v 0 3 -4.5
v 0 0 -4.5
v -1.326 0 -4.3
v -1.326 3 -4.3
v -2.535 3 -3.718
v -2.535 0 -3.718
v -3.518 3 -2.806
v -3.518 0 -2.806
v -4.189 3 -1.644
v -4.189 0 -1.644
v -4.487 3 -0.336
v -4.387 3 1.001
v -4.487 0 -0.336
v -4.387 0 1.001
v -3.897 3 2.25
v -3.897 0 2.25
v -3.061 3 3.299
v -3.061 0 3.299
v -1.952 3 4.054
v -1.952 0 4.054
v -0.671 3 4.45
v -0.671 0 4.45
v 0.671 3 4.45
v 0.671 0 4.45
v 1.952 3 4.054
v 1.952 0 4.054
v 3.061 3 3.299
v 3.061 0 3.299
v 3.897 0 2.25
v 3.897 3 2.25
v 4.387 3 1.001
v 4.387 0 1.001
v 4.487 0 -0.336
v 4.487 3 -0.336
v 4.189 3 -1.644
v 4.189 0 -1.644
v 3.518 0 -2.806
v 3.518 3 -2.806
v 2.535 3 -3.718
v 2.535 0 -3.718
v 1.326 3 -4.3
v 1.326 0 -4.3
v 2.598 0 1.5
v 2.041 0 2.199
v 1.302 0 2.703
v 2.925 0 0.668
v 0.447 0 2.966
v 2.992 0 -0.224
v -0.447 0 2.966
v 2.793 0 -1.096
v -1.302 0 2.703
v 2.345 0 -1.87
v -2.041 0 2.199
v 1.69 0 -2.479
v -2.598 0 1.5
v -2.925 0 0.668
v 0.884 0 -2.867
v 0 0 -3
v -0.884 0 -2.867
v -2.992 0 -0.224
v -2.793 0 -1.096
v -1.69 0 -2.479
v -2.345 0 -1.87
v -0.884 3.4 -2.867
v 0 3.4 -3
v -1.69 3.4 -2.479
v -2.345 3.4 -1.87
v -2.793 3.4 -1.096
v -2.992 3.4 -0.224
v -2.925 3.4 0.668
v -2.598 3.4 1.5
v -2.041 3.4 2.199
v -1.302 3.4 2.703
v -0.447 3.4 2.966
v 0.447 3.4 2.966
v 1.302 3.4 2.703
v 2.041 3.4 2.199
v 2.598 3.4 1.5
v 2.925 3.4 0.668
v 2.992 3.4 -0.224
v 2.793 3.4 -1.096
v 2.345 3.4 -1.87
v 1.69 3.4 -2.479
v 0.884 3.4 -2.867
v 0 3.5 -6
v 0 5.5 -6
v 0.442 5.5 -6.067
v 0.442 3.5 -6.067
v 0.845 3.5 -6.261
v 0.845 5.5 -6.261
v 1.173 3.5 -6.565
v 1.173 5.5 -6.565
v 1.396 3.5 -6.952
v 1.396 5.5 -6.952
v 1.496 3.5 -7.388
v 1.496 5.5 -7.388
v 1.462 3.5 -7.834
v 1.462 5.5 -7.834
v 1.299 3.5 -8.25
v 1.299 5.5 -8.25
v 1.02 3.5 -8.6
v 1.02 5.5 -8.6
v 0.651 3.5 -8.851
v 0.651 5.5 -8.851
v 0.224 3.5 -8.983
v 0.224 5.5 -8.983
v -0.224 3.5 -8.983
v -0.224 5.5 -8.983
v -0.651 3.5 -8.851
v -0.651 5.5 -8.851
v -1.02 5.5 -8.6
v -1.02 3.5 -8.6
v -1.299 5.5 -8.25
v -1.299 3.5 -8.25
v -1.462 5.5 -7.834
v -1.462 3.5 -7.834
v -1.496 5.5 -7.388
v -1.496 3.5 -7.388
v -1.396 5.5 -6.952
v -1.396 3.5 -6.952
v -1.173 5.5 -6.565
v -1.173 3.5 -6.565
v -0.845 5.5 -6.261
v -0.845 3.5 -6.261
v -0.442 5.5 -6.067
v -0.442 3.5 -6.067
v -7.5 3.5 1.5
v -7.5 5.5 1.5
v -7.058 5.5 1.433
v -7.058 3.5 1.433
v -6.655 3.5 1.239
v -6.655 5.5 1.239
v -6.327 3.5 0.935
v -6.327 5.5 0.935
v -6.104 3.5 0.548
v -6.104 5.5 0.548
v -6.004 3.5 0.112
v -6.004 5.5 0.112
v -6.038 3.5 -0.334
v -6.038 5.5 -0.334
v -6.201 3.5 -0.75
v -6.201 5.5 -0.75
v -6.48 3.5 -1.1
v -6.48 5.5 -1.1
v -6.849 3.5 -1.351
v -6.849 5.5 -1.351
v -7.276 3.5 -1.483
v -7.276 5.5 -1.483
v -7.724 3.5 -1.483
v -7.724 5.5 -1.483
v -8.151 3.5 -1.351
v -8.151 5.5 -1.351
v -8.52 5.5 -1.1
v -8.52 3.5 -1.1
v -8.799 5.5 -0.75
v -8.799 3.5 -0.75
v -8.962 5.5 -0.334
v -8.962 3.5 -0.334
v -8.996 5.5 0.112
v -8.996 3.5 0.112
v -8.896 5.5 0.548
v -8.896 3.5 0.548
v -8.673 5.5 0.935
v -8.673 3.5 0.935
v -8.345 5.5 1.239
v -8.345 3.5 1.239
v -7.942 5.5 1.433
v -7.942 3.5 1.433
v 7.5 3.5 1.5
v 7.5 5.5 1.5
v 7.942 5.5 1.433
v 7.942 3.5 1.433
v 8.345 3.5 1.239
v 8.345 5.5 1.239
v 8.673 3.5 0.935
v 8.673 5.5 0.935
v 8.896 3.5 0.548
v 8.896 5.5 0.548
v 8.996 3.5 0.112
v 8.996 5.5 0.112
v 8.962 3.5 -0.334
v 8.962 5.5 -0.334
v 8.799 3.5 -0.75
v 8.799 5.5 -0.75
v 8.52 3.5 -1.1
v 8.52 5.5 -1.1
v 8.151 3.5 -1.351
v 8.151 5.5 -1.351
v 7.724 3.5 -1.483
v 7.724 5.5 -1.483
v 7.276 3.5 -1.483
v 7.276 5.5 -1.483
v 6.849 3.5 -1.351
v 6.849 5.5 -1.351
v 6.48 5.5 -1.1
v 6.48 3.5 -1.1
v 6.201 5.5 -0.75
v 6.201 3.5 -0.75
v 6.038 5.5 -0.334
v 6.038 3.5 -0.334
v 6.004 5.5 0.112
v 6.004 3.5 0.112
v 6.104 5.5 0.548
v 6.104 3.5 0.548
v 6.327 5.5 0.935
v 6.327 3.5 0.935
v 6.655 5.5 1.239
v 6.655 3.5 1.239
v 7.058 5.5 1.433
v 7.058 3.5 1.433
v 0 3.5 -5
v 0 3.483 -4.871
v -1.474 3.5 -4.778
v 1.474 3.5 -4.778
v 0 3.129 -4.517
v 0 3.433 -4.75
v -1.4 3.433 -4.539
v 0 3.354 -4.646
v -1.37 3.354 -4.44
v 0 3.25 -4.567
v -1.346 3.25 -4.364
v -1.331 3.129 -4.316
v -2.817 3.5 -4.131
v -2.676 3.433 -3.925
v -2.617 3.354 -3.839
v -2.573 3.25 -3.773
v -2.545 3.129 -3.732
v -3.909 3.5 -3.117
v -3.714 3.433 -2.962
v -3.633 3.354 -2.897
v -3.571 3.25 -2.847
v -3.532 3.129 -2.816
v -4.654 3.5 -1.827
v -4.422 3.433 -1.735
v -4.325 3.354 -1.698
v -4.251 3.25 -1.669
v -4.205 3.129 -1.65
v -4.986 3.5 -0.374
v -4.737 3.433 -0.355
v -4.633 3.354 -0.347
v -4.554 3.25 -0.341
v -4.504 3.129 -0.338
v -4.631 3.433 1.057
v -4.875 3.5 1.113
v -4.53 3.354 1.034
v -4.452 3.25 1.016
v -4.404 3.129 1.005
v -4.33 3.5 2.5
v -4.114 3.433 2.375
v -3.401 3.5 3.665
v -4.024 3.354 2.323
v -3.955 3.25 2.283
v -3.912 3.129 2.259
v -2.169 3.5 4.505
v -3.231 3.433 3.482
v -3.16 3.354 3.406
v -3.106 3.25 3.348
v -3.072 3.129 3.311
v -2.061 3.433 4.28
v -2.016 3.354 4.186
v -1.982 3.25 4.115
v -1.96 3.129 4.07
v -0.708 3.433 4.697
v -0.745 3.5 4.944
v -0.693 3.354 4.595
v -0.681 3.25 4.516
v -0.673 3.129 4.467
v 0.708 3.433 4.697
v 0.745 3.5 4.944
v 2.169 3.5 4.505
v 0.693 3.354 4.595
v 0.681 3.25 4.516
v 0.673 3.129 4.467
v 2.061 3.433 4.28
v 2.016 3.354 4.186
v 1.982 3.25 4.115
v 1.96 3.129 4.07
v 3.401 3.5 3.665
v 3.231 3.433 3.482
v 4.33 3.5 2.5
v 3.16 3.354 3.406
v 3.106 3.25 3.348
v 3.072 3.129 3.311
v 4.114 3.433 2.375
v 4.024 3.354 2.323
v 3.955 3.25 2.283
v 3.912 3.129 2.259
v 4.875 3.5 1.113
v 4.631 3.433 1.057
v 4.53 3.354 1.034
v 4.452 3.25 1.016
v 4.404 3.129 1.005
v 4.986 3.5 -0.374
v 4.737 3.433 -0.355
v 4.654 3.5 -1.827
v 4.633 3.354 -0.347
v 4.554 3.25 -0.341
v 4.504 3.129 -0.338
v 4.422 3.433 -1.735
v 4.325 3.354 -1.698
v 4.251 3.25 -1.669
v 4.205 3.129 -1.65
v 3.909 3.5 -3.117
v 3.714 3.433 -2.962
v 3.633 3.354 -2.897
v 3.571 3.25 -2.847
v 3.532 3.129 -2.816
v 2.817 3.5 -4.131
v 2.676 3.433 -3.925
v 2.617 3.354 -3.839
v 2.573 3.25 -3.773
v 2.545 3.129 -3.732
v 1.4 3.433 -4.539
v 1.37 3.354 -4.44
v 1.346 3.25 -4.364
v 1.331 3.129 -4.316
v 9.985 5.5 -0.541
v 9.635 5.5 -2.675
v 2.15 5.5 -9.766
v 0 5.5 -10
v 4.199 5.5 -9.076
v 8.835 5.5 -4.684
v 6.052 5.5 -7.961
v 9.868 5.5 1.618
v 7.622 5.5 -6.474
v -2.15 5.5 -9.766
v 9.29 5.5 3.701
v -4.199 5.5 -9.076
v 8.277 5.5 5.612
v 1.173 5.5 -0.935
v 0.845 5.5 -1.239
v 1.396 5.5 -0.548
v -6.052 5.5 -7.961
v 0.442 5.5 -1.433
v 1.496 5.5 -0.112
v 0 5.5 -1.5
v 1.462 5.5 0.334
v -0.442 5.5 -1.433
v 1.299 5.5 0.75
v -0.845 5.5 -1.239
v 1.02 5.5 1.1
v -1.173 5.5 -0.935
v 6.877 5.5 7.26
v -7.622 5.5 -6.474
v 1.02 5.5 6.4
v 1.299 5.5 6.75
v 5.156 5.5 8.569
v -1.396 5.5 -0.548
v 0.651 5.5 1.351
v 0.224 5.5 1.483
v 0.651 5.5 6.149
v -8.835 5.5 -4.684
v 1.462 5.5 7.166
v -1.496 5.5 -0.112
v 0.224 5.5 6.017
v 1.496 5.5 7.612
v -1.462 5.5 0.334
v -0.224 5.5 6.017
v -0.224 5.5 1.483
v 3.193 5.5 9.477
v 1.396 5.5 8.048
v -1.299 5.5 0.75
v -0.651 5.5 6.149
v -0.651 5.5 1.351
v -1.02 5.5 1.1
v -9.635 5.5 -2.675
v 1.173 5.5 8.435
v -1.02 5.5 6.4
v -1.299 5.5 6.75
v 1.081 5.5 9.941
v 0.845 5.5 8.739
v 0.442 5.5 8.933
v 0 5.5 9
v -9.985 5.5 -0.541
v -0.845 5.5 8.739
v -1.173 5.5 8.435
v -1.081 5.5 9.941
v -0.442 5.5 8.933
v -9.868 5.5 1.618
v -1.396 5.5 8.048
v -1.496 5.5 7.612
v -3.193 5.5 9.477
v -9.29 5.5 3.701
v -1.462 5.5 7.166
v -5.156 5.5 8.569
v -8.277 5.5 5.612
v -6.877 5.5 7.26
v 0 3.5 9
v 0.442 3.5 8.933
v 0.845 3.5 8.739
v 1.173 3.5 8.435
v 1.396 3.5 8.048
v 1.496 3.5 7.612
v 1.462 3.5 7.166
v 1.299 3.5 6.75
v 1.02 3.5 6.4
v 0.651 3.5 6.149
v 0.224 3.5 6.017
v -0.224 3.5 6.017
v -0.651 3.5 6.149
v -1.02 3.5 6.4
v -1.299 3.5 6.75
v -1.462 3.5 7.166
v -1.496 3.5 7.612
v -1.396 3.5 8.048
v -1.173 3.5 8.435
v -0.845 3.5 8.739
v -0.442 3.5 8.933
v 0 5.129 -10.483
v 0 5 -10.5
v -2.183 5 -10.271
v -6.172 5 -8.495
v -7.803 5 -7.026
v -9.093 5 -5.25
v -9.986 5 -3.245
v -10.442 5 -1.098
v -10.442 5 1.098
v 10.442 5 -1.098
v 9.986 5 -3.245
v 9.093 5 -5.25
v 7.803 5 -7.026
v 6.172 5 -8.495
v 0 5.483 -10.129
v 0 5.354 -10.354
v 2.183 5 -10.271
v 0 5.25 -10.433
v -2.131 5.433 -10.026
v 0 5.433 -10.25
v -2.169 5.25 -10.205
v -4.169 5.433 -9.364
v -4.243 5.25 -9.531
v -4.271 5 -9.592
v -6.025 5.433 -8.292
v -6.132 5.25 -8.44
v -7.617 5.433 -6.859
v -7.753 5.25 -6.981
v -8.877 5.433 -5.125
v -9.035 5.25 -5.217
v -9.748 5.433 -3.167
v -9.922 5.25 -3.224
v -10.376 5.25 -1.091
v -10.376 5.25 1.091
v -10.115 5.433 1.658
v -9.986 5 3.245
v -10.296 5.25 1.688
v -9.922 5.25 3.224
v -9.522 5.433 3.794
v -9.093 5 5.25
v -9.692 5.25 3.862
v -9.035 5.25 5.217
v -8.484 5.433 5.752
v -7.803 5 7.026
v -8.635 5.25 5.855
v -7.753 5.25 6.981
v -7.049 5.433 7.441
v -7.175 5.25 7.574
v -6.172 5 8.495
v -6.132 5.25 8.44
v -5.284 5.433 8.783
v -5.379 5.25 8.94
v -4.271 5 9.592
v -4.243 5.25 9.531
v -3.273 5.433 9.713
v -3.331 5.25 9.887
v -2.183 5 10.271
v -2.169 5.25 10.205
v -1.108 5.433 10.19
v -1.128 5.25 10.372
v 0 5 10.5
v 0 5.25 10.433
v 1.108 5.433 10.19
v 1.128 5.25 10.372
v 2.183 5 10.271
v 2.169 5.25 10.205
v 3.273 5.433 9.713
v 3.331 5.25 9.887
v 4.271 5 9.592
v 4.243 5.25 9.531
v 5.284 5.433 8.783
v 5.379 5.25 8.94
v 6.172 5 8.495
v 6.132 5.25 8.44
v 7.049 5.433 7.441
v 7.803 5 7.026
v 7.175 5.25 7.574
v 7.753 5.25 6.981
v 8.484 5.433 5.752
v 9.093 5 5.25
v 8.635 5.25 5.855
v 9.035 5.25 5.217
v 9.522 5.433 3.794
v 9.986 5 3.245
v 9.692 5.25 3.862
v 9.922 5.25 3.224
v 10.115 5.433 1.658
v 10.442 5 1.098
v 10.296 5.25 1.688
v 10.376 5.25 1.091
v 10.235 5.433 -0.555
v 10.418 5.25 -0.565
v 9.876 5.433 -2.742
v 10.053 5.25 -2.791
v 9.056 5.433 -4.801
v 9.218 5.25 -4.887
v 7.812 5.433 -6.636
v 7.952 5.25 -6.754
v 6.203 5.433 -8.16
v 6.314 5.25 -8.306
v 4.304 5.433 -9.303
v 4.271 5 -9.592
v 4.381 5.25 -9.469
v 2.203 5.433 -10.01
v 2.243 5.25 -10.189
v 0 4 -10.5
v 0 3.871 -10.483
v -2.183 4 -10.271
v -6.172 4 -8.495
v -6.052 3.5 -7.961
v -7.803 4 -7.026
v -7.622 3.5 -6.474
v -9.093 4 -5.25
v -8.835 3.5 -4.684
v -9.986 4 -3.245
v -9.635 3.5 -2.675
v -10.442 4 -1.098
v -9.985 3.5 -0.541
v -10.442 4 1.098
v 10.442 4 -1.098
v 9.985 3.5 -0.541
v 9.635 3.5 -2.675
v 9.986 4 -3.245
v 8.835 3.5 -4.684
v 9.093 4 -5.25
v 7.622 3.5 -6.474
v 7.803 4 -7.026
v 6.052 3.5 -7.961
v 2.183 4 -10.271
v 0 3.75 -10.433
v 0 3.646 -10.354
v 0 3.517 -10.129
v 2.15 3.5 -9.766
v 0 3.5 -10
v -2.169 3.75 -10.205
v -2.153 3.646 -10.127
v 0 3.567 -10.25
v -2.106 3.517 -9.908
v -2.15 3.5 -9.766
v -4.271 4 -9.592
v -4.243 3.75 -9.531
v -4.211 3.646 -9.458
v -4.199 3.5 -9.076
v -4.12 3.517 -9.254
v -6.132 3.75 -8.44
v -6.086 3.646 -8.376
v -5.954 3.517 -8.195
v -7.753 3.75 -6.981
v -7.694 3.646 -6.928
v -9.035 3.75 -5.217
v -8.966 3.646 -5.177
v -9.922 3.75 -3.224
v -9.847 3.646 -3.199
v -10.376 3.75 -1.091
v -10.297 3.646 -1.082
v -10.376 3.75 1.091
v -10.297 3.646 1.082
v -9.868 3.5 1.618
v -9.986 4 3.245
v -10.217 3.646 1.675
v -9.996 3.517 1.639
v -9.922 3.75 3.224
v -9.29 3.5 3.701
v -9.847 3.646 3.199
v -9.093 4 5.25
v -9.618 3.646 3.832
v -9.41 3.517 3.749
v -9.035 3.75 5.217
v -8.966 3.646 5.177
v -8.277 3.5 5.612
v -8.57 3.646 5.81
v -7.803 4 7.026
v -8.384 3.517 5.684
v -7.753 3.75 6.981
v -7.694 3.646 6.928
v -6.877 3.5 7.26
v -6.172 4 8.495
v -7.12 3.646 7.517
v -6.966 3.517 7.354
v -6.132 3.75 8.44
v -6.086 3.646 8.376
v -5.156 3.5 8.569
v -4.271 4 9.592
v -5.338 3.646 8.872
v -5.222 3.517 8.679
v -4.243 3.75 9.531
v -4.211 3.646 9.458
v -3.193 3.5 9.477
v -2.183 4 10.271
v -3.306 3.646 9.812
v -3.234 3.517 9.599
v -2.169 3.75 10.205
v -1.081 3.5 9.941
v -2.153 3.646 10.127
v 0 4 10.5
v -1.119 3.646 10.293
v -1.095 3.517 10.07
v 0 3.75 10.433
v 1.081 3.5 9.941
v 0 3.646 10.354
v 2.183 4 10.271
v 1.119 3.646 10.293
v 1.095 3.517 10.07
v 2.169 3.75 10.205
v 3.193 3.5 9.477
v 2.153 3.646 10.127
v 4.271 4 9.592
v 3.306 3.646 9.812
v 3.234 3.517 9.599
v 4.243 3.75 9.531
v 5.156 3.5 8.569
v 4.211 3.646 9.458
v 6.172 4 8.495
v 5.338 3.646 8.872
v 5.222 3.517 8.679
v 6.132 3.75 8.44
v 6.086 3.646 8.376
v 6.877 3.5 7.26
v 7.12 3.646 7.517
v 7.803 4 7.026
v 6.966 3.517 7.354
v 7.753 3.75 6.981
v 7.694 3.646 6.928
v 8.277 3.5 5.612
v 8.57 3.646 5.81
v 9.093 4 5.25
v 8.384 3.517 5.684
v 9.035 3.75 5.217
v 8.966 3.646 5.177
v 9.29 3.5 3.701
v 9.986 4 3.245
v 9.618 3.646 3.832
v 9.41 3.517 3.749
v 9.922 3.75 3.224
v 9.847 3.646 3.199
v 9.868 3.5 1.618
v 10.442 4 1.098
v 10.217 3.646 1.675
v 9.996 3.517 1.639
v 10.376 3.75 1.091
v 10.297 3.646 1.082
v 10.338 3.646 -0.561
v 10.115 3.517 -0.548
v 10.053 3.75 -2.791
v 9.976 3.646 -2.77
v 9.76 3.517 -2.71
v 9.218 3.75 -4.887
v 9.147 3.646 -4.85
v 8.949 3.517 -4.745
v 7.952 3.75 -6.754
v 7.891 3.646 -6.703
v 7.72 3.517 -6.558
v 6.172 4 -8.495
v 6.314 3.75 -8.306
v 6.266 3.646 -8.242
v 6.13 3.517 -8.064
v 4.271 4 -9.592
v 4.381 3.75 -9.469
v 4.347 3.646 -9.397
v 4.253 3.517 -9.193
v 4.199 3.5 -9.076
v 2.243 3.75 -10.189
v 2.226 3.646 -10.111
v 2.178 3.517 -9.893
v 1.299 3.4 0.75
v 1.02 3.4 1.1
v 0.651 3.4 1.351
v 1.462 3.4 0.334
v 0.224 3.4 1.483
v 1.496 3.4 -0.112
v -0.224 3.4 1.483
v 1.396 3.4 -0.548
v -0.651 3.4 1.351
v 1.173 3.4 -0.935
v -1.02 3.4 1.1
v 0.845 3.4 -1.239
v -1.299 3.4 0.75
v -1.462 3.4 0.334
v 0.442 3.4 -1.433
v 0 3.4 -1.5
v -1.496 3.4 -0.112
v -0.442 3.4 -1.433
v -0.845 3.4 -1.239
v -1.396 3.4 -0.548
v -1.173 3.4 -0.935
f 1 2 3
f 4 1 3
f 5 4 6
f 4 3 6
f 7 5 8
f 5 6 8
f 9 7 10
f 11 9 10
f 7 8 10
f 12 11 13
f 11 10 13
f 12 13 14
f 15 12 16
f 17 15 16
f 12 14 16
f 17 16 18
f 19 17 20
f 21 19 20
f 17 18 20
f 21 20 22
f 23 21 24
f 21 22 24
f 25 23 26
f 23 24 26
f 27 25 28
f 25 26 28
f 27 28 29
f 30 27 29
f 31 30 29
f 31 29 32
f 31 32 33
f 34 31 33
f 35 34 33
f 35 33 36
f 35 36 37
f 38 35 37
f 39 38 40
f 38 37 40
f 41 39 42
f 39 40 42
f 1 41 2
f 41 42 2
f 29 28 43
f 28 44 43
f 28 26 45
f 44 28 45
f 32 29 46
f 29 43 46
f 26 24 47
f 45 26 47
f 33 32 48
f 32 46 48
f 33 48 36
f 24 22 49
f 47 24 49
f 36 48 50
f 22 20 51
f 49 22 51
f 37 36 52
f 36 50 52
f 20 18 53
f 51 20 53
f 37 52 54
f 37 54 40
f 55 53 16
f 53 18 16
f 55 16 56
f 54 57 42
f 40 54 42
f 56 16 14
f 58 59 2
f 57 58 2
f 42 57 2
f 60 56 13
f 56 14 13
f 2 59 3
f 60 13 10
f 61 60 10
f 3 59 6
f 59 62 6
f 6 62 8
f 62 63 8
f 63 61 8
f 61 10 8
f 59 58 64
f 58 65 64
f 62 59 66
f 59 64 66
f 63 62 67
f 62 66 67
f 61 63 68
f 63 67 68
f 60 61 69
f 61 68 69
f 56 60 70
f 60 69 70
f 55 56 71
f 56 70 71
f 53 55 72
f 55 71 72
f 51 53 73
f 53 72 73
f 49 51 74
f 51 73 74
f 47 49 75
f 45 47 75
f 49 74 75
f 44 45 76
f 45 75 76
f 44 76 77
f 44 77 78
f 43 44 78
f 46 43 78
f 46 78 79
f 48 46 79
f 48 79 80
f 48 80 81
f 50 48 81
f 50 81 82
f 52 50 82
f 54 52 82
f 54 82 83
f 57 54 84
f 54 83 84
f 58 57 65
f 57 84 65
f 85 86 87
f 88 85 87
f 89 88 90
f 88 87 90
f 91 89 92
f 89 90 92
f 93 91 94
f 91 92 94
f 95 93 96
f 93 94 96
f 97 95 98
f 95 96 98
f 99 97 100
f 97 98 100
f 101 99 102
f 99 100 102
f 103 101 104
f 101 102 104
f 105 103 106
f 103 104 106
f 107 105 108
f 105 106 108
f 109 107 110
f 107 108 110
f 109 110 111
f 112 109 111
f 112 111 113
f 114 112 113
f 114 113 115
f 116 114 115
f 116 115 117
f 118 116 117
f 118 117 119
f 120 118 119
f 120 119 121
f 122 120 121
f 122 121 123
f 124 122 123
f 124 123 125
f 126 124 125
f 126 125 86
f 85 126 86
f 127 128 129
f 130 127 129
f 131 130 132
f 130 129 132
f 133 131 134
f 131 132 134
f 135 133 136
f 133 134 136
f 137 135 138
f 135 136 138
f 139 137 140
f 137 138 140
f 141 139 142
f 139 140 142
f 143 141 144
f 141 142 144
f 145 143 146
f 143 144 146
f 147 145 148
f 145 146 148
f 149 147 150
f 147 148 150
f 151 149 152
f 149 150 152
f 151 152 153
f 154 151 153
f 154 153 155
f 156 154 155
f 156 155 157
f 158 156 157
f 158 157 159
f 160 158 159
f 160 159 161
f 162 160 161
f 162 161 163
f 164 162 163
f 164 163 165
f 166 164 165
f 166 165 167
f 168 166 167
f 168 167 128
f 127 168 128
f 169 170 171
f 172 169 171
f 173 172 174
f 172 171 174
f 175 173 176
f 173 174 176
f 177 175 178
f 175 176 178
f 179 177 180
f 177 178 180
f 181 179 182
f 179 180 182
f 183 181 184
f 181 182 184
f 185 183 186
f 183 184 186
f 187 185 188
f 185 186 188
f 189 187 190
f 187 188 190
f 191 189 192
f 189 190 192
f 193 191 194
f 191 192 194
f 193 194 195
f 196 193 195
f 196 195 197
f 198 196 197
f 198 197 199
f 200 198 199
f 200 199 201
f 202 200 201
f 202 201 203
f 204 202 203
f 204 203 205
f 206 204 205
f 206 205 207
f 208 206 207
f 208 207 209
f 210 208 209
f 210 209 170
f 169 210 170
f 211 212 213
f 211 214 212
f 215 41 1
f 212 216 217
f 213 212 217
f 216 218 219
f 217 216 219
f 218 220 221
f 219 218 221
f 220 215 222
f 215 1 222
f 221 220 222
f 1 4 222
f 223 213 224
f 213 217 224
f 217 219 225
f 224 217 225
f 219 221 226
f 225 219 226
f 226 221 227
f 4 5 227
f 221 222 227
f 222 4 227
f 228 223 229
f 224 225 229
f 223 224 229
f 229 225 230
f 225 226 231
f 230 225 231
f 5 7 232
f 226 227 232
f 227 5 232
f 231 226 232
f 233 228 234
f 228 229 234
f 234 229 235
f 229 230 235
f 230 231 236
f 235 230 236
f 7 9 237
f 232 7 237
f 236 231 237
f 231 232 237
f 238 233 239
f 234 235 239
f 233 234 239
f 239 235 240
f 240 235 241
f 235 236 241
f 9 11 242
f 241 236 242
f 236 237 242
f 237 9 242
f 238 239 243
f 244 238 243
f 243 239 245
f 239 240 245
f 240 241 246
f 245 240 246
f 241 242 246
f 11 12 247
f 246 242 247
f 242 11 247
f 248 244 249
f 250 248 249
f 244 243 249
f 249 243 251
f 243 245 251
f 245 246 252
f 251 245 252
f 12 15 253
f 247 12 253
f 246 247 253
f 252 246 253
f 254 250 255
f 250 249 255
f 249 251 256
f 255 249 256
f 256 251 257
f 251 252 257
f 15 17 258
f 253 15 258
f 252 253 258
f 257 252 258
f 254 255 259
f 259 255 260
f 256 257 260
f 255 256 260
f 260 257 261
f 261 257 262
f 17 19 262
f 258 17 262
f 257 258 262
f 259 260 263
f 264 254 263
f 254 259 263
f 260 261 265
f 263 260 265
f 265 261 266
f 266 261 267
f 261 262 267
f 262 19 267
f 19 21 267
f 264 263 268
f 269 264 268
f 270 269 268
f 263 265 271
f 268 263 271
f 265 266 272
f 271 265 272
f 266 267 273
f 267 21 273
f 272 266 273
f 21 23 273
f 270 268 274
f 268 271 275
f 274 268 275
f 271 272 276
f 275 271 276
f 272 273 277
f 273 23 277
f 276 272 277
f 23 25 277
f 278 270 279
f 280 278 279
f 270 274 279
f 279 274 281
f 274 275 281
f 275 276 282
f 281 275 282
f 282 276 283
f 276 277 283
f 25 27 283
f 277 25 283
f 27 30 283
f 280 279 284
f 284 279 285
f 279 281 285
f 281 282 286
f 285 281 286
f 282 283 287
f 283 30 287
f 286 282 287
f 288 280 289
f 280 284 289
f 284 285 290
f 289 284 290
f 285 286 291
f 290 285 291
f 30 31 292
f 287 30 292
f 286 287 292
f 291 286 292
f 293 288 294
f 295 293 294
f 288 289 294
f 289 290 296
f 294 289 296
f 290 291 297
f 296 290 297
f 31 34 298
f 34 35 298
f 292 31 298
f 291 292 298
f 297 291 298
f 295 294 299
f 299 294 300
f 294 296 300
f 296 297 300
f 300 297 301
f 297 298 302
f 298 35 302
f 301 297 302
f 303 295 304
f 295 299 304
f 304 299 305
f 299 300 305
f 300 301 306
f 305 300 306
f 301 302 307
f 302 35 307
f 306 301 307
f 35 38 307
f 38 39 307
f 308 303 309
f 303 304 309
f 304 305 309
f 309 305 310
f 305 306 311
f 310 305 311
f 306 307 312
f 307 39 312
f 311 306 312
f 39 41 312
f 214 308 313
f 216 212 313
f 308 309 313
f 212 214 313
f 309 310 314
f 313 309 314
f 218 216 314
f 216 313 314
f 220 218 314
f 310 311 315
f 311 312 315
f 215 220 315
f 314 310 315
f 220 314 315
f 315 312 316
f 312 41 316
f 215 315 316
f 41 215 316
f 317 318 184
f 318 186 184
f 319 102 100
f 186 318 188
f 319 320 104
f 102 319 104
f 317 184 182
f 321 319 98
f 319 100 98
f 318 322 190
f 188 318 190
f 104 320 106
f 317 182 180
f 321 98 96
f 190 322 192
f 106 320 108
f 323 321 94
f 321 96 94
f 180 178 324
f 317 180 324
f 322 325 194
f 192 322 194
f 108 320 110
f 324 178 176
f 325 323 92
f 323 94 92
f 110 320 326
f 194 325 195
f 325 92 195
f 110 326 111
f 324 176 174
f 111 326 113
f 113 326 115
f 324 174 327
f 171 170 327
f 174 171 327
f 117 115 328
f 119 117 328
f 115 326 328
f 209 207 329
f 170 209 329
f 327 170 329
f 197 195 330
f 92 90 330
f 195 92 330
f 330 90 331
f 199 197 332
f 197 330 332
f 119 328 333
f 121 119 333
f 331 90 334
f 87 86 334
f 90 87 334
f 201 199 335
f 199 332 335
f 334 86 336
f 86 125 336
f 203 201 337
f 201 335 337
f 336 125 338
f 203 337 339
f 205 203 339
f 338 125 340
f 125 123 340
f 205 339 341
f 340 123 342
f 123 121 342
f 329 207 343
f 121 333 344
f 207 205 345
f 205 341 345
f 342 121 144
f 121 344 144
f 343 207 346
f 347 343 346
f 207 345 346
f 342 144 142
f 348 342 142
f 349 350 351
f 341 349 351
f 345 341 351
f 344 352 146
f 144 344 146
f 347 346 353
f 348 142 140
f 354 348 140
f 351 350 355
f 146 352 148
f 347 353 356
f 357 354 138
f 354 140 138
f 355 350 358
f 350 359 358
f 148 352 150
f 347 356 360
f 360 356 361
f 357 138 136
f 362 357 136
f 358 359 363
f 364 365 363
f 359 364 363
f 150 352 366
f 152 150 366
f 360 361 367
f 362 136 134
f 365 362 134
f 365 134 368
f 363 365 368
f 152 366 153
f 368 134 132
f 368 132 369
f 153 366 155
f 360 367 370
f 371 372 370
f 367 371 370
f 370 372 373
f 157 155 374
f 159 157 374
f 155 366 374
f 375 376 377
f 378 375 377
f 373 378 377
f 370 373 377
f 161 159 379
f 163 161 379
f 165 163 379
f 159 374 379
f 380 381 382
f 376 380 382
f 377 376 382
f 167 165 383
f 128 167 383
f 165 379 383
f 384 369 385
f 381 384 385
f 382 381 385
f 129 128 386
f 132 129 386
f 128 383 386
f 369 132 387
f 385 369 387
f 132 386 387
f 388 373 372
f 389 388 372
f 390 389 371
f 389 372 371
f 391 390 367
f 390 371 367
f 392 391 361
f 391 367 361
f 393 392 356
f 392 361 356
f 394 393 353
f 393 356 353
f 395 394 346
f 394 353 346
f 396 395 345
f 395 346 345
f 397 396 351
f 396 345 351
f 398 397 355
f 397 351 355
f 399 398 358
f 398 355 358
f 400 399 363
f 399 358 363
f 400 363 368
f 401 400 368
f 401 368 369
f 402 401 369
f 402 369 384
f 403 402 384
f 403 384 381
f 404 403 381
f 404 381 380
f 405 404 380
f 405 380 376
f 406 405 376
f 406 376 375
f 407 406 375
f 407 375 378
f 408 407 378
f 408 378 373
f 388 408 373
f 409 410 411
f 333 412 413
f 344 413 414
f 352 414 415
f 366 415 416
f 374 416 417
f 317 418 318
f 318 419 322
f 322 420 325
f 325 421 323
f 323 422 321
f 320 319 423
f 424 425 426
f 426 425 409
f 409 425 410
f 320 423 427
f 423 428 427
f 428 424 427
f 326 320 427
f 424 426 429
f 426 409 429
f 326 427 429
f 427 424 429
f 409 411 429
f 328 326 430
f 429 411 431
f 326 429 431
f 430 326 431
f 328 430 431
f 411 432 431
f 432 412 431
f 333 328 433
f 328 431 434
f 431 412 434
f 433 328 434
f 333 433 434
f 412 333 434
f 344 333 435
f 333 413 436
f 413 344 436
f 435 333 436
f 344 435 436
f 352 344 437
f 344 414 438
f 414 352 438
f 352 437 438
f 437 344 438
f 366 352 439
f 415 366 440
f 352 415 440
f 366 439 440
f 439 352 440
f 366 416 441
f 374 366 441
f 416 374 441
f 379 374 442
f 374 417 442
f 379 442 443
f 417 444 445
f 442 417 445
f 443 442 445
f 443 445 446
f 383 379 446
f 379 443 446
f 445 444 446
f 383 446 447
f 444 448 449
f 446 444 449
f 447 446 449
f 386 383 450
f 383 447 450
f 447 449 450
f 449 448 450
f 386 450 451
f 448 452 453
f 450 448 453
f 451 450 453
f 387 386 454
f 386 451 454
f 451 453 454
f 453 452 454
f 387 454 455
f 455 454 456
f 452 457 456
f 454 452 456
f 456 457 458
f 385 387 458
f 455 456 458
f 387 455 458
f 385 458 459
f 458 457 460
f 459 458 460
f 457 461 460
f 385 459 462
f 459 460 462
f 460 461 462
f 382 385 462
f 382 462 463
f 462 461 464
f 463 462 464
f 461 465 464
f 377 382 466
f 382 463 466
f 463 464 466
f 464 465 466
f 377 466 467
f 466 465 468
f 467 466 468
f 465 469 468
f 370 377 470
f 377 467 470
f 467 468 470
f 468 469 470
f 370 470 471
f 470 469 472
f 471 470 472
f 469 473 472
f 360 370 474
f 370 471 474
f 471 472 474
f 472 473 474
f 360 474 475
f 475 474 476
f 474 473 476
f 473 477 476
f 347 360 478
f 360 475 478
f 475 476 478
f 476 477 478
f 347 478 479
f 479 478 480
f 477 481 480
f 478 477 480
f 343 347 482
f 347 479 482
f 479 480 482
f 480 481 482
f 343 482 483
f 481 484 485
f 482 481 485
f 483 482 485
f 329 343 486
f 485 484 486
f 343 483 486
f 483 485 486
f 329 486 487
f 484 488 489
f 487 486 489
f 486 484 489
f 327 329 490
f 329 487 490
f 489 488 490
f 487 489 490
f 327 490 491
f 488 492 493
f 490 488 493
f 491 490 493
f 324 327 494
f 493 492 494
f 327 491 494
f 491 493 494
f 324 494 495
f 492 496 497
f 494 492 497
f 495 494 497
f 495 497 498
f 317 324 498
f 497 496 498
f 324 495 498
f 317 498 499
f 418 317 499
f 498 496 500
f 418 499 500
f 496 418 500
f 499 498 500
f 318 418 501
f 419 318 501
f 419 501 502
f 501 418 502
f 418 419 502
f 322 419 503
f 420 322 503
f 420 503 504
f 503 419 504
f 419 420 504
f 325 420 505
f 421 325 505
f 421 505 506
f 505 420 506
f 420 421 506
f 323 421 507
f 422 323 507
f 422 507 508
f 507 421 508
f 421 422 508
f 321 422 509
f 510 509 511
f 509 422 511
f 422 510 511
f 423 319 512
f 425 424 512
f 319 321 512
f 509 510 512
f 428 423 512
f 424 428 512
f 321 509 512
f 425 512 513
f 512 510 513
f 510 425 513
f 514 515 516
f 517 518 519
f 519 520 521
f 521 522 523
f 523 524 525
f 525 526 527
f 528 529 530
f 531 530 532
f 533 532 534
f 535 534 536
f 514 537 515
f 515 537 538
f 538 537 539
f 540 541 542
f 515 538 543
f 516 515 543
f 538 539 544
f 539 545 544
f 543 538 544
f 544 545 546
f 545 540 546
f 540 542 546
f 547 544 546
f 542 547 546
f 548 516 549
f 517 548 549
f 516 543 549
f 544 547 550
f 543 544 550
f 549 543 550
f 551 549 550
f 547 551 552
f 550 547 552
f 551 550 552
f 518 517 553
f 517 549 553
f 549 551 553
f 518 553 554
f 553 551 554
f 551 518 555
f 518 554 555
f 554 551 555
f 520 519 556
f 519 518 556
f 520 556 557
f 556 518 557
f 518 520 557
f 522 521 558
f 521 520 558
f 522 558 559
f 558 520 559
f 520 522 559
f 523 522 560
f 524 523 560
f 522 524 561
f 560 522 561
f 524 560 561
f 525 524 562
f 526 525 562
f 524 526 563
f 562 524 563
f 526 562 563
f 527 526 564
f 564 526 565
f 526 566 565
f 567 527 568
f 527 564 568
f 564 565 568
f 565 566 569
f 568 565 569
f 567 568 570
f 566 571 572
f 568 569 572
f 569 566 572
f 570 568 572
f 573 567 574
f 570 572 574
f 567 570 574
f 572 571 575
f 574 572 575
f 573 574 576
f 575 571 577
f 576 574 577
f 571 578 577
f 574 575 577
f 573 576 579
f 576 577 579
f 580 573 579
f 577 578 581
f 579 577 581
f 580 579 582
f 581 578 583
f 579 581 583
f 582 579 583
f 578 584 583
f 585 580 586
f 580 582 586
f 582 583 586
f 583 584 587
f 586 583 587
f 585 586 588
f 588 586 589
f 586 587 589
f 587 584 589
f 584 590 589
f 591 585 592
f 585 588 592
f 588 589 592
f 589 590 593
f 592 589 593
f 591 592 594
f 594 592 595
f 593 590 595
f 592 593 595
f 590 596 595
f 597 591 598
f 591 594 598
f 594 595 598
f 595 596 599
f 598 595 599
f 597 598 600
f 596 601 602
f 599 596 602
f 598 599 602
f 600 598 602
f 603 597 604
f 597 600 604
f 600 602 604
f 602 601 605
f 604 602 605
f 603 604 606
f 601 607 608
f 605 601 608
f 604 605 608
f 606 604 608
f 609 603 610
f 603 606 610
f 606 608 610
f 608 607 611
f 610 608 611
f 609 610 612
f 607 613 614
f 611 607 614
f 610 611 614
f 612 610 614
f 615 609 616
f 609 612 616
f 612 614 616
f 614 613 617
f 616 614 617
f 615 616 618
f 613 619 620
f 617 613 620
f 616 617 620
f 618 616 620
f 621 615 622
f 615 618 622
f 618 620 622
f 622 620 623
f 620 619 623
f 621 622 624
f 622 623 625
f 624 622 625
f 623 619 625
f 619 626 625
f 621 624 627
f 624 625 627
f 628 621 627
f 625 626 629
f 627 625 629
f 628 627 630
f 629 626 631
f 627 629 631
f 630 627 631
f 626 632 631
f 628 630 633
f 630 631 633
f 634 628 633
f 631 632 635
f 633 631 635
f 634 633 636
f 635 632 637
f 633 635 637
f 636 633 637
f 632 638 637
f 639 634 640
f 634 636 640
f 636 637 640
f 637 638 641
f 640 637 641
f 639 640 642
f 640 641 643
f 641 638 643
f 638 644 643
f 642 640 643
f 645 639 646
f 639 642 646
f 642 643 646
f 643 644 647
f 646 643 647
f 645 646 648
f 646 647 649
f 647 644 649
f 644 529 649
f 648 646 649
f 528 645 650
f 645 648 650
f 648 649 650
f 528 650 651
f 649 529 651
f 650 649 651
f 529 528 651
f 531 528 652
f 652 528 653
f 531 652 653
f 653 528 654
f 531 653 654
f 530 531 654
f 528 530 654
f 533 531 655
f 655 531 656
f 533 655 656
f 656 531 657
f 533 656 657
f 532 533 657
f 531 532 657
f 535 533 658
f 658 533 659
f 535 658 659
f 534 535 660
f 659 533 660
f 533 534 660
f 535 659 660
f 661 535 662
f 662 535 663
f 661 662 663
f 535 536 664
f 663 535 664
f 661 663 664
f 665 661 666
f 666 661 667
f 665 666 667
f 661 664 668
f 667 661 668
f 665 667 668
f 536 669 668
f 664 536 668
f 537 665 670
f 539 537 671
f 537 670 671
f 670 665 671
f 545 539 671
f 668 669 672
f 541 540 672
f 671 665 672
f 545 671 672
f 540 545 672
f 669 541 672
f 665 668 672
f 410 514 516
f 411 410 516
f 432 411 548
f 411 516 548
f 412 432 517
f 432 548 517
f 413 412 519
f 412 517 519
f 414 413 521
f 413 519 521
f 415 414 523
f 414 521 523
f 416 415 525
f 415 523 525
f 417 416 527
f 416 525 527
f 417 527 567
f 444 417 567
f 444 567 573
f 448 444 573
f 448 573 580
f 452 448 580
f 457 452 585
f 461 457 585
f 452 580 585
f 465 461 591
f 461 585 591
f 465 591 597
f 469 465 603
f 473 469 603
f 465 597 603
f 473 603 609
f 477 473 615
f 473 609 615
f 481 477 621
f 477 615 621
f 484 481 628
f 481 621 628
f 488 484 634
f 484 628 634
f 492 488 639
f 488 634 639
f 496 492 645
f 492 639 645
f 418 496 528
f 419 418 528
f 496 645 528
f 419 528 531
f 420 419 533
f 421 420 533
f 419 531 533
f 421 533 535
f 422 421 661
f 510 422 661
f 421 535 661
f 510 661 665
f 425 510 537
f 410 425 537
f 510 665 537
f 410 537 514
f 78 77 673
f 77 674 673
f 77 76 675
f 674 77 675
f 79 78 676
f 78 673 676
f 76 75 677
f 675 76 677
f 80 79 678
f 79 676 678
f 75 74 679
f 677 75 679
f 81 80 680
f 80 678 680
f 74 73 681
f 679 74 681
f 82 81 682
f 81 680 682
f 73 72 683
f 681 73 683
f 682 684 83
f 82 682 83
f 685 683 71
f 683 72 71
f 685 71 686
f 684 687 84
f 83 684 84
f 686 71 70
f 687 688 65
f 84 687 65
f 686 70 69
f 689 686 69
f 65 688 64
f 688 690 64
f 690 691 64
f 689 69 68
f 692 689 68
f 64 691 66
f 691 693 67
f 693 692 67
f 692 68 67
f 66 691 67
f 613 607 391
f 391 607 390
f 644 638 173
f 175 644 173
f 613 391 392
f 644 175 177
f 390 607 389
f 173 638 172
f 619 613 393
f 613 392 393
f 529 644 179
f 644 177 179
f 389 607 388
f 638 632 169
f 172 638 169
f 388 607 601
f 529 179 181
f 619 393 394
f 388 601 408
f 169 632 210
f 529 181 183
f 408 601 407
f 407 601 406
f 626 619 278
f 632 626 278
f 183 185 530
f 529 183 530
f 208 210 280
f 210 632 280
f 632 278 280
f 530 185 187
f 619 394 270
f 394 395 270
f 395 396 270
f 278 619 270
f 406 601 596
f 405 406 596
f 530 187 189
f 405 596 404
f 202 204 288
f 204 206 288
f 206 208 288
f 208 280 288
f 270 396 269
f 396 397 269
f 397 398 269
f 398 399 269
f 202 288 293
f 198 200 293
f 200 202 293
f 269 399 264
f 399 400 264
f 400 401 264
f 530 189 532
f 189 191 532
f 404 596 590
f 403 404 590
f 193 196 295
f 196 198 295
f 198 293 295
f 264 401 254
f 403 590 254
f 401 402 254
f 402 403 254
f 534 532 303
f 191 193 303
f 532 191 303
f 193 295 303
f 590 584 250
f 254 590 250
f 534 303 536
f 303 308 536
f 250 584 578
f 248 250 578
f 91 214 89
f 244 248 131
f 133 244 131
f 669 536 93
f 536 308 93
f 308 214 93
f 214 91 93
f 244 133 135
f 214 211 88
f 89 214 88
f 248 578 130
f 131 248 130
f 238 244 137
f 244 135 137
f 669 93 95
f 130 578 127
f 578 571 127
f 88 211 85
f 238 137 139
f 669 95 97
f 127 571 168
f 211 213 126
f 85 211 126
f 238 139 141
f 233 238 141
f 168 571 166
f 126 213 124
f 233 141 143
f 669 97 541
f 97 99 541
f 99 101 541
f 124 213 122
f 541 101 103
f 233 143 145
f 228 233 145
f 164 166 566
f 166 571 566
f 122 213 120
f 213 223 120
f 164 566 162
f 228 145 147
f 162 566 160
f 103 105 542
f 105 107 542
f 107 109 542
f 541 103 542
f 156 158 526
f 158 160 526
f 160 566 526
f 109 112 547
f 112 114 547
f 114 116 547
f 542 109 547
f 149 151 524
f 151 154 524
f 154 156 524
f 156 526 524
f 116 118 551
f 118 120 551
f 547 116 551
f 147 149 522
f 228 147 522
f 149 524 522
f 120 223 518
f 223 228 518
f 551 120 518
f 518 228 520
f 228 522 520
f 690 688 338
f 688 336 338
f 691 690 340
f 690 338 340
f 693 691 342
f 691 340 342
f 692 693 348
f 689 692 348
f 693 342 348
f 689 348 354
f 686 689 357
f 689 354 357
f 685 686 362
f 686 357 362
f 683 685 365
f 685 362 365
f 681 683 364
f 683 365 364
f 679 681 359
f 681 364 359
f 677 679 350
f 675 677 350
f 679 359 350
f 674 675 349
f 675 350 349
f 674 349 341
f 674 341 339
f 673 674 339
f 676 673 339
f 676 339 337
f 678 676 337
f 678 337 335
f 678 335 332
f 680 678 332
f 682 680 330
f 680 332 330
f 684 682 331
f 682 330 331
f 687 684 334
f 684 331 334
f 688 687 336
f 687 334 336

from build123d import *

# Parameters (mm, degrees)
FILLET1_R          = 0.5
SKETCH2_R          = 1.5
CUT_EXTRUDE1_DEPTH = 16.835087755


with BuildPart() as part:
    # Sketch1 → Revolve1 (revolve)
    with BuildSketch(Plane.XY, mode=Mode.PRIVATE) as revolve1_sk:
        Polygon((3, 0), (3, 3.4), (1.5, 3.4), (1.5, 5.5), (10.5, 5.5), (10.5, 3.5), (4.5, 3.5), (4.5, 0), align=None)
    revolve(revolve1_sk.sketch.rotate(Axis((0, 0, 0), (0, 1, 0)), 90), axis=Axis((0, 0, 0), (0, 1, 0)))

    # Fillet1
    fillet1_edges = [part.edges().sort_by_distance(p)[0] for p in [
        (0, 5.5, 10.5),
        (0, 3.5, 10.5),
        (0, 3.5, 4.5),
    ]]
    fillet(fillet1_edges, radius=FILLET1_R)

    # Sketch2 → Cut-Extrude1 (cut, through all)
    with BuildSketch(Plane(origin=(0, 5.5, 0), x_dir=(1, 0, 0), z_dir=(0, 1, 0))):
        with Locations(Location((0, 7.5, 0), (0, 0, 270))):
            Circle(SKETCH2_R)
        with Locations(Location((-7.5, 0, 0), (0, 0, 270))):
            Circle(SKETCH2_R)
        with Locations(Location((0, -7.5, 0), (0, 0, 270))):
            Circle(SKETCH2_R)
        with Locations(Location((7.5, 0, 0), (0, 0, 270))):
            Circle(SKETCH2_R)
    extrude(amount=-CUT_EXTRUDE1_DEPTH, mode=Mode.SUBTRACT)


solid = part.part
